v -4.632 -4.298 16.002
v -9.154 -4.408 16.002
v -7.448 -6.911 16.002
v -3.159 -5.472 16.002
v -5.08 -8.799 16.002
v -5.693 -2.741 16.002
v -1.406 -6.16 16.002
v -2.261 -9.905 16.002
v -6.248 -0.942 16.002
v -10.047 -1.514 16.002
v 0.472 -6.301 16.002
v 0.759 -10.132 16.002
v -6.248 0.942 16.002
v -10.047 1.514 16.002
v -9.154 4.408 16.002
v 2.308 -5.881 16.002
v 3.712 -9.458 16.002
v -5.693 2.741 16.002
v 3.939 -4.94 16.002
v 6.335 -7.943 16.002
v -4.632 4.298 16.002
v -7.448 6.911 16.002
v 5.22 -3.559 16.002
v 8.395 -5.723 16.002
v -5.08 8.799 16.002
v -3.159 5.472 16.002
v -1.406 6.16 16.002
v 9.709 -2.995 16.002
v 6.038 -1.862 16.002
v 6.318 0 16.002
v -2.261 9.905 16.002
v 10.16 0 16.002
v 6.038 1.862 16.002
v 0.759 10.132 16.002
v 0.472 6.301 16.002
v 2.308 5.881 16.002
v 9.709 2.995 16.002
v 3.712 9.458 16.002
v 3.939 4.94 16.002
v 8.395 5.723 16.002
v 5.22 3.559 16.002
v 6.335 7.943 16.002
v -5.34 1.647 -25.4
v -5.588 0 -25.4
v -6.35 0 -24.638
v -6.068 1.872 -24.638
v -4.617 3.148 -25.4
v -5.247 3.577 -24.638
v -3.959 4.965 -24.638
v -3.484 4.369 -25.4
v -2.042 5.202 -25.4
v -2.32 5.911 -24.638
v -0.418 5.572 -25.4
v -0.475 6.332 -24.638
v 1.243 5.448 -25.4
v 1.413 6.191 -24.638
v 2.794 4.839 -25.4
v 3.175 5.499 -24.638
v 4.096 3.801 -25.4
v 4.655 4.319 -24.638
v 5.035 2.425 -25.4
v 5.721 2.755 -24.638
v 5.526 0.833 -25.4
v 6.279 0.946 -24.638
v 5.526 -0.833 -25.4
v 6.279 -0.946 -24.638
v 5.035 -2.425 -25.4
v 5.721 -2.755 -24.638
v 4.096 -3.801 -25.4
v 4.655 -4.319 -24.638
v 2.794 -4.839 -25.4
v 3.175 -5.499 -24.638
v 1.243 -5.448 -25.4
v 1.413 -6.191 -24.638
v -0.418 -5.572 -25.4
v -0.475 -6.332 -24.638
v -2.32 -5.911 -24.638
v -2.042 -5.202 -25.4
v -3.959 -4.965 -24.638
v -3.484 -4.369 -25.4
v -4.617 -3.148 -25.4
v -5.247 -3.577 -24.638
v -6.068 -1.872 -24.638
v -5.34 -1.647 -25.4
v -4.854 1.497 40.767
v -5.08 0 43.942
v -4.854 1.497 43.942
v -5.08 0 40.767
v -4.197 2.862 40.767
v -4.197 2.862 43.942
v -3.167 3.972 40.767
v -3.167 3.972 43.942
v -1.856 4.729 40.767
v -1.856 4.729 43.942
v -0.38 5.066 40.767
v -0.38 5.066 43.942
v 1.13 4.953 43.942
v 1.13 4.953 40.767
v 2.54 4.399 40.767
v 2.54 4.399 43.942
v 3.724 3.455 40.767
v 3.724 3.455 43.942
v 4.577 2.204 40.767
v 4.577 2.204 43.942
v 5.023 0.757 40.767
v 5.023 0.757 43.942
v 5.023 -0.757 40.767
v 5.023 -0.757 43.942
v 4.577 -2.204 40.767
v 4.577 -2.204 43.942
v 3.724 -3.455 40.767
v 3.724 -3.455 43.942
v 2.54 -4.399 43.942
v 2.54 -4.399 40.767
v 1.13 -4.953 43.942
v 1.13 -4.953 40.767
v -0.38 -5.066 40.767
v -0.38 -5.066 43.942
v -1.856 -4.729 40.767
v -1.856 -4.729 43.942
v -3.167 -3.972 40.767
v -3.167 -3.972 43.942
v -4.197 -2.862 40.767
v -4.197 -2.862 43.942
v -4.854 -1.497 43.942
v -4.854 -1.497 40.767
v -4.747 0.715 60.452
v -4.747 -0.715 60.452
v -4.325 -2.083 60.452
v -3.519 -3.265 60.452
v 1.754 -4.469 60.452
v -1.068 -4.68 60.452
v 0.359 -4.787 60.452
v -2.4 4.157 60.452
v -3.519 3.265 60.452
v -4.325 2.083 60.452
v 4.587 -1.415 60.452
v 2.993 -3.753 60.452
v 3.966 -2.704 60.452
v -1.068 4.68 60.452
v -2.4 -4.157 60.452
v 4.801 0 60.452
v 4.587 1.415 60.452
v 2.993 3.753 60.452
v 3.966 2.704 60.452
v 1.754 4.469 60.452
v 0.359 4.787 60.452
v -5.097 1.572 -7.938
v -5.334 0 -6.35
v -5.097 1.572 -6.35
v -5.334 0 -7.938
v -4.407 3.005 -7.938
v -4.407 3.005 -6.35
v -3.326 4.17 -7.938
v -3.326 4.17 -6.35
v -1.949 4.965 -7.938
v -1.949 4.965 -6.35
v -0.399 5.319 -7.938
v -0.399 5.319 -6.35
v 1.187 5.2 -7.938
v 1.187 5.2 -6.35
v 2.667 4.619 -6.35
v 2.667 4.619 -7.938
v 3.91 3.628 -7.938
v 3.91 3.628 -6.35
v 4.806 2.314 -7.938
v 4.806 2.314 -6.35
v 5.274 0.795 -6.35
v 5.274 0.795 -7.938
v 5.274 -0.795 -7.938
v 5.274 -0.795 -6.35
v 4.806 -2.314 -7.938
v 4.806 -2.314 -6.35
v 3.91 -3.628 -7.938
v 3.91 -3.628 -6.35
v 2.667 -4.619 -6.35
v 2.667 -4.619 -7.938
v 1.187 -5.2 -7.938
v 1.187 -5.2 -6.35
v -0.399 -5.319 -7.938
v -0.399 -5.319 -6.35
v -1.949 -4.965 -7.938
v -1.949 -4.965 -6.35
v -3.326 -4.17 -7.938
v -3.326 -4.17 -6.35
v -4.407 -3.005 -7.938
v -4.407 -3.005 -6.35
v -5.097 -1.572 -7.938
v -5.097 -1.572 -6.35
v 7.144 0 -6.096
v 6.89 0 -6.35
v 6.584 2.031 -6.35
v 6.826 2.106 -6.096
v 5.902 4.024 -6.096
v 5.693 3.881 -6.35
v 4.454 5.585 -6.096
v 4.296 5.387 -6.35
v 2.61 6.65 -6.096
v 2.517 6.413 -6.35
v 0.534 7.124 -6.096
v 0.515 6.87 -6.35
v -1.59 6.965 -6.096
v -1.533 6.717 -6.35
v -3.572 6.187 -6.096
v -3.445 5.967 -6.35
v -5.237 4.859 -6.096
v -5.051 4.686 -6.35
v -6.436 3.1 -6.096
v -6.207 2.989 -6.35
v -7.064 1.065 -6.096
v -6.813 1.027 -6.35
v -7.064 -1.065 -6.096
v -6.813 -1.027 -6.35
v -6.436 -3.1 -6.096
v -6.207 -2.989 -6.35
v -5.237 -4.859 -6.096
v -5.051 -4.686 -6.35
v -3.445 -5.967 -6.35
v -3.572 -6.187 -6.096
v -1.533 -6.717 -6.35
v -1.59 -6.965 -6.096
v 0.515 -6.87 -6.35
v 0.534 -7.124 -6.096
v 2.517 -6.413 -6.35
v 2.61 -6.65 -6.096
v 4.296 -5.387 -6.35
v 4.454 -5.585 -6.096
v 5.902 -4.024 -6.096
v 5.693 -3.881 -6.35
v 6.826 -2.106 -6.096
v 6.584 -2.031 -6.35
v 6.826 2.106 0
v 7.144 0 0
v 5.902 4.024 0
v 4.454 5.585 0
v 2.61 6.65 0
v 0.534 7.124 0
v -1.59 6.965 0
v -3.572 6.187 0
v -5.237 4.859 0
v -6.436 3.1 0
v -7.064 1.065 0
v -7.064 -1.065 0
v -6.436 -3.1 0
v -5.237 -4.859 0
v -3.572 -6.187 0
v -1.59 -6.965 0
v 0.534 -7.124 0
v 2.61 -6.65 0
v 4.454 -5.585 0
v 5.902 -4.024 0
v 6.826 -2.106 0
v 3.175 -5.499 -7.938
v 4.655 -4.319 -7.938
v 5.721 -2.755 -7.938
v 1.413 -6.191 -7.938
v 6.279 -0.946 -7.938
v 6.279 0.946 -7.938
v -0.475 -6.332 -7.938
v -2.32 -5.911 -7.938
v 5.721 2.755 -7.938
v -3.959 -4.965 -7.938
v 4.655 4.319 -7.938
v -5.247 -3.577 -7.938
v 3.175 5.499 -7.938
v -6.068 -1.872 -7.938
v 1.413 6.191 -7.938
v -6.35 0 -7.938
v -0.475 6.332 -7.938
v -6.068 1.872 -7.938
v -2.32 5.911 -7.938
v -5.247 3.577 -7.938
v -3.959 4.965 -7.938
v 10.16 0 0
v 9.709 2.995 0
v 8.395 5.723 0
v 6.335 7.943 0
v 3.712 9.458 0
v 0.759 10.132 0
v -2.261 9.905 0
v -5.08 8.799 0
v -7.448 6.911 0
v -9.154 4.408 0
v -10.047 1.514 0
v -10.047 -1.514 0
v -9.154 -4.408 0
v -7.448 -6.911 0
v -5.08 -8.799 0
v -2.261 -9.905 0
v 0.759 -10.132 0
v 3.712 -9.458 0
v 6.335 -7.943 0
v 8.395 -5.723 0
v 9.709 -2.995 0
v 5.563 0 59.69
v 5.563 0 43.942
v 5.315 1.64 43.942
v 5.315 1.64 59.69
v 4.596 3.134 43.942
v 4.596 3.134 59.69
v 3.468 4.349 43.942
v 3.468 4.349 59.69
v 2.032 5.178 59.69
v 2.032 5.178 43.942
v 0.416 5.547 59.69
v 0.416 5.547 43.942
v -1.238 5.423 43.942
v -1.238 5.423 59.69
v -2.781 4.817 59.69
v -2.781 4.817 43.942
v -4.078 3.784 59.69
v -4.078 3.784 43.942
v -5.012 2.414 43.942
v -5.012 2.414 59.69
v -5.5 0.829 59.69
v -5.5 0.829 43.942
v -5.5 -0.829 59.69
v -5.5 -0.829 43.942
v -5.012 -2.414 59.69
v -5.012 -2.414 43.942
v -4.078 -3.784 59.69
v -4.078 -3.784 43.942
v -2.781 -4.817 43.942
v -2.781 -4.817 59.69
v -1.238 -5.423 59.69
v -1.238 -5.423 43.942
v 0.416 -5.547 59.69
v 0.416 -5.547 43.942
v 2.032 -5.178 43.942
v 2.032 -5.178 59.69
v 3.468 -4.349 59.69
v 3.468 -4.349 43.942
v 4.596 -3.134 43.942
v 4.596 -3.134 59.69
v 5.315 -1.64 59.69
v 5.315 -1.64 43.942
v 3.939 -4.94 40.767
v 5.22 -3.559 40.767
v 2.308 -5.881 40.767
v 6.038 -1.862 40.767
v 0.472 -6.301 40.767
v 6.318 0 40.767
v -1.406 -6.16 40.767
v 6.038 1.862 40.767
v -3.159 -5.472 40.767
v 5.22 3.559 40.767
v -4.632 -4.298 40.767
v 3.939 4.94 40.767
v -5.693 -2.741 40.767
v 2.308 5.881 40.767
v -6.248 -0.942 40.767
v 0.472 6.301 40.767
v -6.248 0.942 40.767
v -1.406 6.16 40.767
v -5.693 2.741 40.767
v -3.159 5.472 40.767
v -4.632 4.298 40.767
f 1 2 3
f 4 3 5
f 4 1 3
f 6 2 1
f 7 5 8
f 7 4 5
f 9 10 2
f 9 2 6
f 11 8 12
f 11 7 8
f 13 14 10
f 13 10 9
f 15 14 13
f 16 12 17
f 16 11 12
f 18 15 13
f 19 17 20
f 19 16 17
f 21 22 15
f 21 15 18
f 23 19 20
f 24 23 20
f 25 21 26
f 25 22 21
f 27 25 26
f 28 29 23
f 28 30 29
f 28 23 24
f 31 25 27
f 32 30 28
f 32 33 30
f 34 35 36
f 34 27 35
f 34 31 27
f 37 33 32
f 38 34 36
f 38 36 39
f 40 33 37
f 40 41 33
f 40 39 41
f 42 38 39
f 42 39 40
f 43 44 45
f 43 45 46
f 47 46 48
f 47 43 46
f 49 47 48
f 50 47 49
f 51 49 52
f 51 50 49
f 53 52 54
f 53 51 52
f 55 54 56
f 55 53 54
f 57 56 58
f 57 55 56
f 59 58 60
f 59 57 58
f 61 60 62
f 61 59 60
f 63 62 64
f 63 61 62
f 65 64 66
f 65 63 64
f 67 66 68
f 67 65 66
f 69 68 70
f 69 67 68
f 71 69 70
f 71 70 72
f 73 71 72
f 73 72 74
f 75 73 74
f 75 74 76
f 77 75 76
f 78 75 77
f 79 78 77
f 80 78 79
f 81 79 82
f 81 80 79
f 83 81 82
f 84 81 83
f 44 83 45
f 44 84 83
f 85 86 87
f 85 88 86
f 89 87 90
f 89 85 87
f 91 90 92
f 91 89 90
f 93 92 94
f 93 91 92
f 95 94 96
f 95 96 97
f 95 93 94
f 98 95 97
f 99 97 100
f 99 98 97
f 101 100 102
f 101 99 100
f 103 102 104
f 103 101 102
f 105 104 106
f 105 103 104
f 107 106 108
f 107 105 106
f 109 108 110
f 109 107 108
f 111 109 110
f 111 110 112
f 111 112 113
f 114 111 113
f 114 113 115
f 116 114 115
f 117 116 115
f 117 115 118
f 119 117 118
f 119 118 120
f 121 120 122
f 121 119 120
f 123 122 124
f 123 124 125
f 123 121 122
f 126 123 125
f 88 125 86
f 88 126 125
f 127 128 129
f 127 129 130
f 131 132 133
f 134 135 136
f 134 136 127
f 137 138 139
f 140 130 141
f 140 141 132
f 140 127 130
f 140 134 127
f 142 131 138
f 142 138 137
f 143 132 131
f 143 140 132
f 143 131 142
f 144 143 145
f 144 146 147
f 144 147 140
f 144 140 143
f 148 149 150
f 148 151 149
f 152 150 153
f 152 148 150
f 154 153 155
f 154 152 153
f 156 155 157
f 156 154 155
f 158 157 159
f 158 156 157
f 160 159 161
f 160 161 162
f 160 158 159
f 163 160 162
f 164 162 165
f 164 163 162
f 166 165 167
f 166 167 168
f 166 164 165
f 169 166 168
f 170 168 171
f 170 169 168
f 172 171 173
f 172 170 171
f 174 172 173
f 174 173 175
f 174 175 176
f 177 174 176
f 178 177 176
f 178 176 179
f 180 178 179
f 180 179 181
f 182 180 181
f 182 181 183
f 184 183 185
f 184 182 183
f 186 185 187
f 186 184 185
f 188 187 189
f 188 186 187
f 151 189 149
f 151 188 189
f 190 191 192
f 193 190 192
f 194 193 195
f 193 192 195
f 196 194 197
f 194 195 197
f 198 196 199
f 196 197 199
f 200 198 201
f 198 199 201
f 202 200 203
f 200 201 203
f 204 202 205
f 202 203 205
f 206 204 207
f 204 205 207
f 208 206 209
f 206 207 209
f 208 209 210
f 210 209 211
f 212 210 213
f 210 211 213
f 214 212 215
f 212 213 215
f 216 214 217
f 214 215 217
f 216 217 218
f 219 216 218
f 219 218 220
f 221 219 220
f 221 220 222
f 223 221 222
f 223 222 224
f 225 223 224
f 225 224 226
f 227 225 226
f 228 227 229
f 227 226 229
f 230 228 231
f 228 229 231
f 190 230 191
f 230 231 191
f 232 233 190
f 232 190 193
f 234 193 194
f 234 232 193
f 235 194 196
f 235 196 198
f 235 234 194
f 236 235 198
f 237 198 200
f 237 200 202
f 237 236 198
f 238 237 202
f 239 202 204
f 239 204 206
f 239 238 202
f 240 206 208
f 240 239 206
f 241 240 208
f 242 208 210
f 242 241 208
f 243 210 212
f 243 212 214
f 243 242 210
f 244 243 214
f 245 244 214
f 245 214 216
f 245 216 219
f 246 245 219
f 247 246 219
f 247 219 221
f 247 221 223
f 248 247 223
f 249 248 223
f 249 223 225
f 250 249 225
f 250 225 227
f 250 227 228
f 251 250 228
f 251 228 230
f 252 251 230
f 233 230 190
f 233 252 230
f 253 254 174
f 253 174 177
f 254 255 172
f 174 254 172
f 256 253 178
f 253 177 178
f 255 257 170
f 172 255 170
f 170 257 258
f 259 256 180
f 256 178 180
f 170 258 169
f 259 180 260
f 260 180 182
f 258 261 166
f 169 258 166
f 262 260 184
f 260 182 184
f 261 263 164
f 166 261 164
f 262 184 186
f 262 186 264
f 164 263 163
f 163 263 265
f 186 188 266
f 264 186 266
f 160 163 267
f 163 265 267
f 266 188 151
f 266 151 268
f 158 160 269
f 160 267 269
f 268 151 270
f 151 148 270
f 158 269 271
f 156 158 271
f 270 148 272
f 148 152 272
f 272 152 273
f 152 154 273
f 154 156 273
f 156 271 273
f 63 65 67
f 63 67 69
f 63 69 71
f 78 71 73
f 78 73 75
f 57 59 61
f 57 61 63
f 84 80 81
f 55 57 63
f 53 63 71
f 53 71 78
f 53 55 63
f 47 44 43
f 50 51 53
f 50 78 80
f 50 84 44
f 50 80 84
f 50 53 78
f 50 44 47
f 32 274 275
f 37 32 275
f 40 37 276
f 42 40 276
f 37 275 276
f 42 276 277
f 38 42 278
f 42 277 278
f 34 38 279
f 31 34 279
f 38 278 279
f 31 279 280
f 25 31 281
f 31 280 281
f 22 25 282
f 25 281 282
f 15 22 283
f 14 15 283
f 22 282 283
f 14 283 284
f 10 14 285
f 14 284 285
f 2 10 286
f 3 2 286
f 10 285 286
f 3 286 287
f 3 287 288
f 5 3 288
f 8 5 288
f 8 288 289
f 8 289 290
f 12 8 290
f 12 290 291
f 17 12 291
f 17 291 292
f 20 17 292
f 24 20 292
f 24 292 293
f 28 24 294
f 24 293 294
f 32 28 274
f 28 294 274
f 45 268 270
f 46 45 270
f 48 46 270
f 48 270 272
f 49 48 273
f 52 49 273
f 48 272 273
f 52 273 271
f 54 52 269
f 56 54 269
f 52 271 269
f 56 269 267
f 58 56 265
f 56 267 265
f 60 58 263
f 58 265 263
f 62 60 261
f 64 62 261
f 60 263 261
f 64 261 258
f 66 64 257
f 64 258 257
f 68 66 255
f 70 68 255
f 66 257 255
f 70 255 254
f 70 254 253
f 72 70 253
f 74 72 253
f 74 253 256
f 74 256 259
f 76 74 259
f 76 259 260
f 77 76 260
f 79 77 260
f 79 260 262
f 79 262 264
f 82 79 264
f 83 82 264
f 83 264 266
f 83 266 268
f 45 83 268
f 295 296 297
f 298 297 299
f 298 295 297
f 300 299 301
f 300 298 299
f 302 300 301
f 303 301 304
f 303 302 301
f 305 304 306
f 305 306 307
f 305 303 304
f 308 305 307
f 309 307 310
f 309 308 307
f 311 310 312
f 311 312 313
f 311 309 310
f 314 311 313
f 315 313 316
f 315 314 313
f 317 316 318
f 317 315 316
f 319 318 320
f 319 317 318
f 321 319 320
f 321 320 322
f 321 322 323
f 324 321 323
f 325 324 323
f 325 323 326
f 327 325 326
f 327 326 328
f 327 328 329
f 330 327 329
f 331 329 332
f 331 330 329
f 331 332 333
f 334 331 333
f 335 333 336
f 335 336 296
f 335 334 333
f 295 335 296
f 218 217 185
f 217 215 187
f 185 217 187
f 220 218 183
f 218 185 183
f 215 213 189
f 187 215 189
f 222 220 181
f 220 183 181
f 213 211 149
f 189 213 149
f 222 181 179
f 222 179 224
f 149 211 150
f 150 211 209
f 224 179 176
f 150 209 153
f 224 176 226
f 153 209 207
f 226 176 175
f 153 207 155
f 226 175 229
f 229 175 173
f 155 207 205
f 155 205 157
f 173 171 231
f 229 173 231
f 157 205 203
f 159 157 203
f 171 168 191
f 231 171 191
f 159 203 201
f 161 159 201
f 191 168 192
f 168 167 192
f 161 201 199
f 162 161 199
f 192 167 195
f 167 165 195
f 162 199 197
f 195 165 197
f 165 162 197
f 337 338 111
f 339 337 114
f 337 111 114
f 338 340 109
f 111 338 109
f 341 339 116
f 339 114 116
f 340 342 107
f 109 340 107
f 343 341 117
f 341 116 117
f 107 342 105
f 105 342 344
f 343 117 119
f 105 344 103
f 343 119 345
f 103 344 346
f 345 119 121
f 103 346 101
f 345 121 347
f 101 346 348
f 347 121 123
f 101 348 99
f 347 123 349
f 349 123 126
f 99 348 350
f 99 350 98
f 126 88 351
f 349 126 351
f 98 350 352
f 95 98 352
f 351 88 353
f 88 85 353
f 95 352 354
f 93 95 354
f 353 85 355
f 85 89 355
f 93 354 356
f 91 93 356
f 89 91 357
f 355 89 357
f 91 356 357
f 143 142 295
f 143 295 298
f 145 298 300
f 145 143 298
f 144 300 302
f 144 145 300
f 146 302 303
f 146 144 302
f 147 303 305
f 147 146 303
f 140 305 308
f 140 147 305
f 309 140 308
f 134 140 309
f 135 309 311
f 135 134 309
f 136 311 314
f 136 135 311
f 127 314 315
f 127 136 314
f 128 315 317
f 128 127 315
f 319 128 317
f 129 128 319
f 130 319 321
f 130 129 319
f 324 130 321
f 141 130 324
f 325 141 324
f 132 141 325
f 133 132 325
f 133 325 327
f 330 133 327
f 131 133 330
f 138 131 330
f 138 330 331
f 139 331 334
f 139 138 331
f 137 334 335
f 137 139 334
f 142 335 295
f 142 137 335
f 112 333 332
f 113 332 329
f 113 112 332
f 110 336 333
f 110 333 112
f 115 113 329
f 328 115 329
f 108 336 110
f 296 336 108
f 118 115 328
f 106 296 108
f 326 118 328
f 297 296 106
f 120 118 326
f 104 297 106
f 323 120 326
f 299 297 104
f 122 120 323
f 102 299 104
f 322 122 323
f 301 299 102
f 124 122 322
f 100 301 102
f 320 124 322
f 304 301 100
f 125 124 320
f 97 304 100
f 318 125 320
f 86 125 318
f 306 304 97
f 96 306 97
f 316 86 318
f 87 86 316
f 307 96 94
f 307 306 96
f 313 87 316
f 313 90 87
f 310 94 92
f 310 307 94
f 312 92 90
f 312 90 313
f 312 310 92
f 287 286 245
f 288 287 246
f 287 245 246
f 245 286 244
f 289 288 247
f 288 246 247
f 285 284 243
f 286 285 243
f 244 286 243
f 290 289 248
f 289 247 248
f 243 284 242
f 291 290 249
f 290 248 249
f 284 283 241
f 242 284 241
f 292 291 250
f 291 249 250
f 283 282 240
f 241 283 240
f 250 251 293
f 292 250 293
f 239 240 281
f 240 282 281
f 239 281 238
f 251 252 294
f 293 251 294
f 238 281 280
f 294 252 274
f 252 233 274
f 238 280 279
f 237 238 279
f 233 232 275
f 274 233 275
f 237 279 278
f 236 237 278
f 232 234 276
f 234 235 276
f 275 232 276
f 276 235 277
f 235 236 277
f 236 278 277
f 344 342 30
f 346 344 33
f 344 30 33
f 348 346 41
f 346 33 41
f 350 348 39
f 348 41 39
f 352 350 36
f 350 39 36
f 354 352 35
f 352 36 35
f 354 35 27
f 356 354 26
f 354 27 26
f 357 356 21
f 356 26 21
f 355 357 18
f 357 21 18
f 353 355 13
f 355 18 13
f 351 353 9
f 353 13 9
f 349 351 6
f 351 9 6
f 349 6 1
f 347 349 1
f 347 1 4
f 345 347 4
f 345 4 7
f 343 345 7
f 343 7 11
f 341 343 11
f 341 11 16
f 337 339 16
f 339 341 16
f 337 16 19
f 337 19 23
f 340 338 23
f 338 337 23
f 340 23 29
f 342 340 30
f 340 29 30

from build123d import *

# Parameters (mm, degrees)
SKETCH1_R           = 7.14375
BOSS_EXTRUDE1_DEPTH = 6.35
SKETCH2_R           = 10.16
BOSS_EXTRUDE2_DEPTH = 16.002
CHAMFER1_SIZE       = 0.254
SKETCH3_R           = 6.31825
BOSS_EXTRUDE3_DEPTH = 44.45
SKETCH5_R           = 6.35
BOSS_EXTRUDE4_DEPTH = 19.05
SKETCH11_R          = 6.31825
SKETCH11_R_2        = 5.5626
CUT_EXTRUDE2_DEPTH  = 16.51
CHAMFER2_SIZE       = 0.762
SKETCH8_W           = 1.016
SKETCH8_H           = 1.5875
SKETCH10_W          = 1.27
SKETCH10_H          = 3.175


with BuildPart() as part:
    # Sketch1 → Boss-Extrude1 (new body)
    with BuildSketch(Plane.XY):
        Circle(SKETCH1_R)
    extrude(amount=-BOSS_EXTRUDE1_DEPTH)

    # Sketch2 → Boss-Extrude2 (add)
    with BuildSketch(Plane.XY):
        Circle(SKETCH2_R)
    extrude(amount=BOSS_EXTRUDE2_DEPTH)

    # Chamfer1
    chamfer1_edges = [part.edges().sort_by_distance(p)[0] for p in [
        (-7.14375, 0, -6.35),
    ]]
    chamfer(chamfer1_edges, length=CHAMFER1_SIZE)

    # Sketch3 → Boss-Extrude3 (add)
    with BuildSketch(Plane.XY.offset(16.002)):
        Circle(SKETCH3_R)
    extrude(amount=BOSS_EXTRUDE3_DEPTH)

    # Sketch5 → Boss-Extrude4 (add)
    with BuildSketch(Plane(origin=(0, 0, -6.35), x_dir=(-1, 0, 0), z_dir=(0, 0, -1))):
        Circle(SKETCH5_R)
    extrude(amount=BOSS_EXTRUDE4_DEPTH)

    # Sketch11 → Cut-Extrude2 (cut)
    with BuildSketch(Plane.XY.offset(60.452)):
        Circle(SKETCH11_R)
        Circle(SKETCH11_R_2, mode=Mode.SUBTRACT)
    extrude(amount=-CUT_EXTRUDE2_DEPTH, mode=Mode.SUBTRACT)

    # Chamfer2
    chamfer2_edges = [part.edges().sort_by_distance(p)[0] for p in [
        (6.35, 0, -25.4),
        (-5.5626, 0, 60.452),
    ]]
    chamfer(chamfer2_edges, length=CHAMFER2_SIZE)

    # Sketch8 → Cut-Revolve3 (revolve, cut)
    with BuildSketch(Plane(origin=(0, 0, 0), x_dir=(1, 0, 0), z_dir=(0, 1, 0))):
        with Locations((-5.842, 7.14375)):
            Rectangle(SKETCH8_W, SKETCH8_H)
    revolve(axis=Axis((0, 0, 0), (0, 0, -1)), mode=Mode.SUBTRACT)

    # Sketch10 → Cut-Revolve4 (revolve, cut)
    with BuildSketch(Plane(origin=(0, 0, 0), x_dir=(1, 0, 0), z_dir=(0, 1, 0))):
        with Locations((-5.715, -42.3545)):
            Rectangle(SKETCH10_W, SKETCH10_H)
    revolve(axis=Axis((0, 0, 67.984878541), (0, 0, -1)), mode=Mode.SUBTRACT)


solid = part.part
